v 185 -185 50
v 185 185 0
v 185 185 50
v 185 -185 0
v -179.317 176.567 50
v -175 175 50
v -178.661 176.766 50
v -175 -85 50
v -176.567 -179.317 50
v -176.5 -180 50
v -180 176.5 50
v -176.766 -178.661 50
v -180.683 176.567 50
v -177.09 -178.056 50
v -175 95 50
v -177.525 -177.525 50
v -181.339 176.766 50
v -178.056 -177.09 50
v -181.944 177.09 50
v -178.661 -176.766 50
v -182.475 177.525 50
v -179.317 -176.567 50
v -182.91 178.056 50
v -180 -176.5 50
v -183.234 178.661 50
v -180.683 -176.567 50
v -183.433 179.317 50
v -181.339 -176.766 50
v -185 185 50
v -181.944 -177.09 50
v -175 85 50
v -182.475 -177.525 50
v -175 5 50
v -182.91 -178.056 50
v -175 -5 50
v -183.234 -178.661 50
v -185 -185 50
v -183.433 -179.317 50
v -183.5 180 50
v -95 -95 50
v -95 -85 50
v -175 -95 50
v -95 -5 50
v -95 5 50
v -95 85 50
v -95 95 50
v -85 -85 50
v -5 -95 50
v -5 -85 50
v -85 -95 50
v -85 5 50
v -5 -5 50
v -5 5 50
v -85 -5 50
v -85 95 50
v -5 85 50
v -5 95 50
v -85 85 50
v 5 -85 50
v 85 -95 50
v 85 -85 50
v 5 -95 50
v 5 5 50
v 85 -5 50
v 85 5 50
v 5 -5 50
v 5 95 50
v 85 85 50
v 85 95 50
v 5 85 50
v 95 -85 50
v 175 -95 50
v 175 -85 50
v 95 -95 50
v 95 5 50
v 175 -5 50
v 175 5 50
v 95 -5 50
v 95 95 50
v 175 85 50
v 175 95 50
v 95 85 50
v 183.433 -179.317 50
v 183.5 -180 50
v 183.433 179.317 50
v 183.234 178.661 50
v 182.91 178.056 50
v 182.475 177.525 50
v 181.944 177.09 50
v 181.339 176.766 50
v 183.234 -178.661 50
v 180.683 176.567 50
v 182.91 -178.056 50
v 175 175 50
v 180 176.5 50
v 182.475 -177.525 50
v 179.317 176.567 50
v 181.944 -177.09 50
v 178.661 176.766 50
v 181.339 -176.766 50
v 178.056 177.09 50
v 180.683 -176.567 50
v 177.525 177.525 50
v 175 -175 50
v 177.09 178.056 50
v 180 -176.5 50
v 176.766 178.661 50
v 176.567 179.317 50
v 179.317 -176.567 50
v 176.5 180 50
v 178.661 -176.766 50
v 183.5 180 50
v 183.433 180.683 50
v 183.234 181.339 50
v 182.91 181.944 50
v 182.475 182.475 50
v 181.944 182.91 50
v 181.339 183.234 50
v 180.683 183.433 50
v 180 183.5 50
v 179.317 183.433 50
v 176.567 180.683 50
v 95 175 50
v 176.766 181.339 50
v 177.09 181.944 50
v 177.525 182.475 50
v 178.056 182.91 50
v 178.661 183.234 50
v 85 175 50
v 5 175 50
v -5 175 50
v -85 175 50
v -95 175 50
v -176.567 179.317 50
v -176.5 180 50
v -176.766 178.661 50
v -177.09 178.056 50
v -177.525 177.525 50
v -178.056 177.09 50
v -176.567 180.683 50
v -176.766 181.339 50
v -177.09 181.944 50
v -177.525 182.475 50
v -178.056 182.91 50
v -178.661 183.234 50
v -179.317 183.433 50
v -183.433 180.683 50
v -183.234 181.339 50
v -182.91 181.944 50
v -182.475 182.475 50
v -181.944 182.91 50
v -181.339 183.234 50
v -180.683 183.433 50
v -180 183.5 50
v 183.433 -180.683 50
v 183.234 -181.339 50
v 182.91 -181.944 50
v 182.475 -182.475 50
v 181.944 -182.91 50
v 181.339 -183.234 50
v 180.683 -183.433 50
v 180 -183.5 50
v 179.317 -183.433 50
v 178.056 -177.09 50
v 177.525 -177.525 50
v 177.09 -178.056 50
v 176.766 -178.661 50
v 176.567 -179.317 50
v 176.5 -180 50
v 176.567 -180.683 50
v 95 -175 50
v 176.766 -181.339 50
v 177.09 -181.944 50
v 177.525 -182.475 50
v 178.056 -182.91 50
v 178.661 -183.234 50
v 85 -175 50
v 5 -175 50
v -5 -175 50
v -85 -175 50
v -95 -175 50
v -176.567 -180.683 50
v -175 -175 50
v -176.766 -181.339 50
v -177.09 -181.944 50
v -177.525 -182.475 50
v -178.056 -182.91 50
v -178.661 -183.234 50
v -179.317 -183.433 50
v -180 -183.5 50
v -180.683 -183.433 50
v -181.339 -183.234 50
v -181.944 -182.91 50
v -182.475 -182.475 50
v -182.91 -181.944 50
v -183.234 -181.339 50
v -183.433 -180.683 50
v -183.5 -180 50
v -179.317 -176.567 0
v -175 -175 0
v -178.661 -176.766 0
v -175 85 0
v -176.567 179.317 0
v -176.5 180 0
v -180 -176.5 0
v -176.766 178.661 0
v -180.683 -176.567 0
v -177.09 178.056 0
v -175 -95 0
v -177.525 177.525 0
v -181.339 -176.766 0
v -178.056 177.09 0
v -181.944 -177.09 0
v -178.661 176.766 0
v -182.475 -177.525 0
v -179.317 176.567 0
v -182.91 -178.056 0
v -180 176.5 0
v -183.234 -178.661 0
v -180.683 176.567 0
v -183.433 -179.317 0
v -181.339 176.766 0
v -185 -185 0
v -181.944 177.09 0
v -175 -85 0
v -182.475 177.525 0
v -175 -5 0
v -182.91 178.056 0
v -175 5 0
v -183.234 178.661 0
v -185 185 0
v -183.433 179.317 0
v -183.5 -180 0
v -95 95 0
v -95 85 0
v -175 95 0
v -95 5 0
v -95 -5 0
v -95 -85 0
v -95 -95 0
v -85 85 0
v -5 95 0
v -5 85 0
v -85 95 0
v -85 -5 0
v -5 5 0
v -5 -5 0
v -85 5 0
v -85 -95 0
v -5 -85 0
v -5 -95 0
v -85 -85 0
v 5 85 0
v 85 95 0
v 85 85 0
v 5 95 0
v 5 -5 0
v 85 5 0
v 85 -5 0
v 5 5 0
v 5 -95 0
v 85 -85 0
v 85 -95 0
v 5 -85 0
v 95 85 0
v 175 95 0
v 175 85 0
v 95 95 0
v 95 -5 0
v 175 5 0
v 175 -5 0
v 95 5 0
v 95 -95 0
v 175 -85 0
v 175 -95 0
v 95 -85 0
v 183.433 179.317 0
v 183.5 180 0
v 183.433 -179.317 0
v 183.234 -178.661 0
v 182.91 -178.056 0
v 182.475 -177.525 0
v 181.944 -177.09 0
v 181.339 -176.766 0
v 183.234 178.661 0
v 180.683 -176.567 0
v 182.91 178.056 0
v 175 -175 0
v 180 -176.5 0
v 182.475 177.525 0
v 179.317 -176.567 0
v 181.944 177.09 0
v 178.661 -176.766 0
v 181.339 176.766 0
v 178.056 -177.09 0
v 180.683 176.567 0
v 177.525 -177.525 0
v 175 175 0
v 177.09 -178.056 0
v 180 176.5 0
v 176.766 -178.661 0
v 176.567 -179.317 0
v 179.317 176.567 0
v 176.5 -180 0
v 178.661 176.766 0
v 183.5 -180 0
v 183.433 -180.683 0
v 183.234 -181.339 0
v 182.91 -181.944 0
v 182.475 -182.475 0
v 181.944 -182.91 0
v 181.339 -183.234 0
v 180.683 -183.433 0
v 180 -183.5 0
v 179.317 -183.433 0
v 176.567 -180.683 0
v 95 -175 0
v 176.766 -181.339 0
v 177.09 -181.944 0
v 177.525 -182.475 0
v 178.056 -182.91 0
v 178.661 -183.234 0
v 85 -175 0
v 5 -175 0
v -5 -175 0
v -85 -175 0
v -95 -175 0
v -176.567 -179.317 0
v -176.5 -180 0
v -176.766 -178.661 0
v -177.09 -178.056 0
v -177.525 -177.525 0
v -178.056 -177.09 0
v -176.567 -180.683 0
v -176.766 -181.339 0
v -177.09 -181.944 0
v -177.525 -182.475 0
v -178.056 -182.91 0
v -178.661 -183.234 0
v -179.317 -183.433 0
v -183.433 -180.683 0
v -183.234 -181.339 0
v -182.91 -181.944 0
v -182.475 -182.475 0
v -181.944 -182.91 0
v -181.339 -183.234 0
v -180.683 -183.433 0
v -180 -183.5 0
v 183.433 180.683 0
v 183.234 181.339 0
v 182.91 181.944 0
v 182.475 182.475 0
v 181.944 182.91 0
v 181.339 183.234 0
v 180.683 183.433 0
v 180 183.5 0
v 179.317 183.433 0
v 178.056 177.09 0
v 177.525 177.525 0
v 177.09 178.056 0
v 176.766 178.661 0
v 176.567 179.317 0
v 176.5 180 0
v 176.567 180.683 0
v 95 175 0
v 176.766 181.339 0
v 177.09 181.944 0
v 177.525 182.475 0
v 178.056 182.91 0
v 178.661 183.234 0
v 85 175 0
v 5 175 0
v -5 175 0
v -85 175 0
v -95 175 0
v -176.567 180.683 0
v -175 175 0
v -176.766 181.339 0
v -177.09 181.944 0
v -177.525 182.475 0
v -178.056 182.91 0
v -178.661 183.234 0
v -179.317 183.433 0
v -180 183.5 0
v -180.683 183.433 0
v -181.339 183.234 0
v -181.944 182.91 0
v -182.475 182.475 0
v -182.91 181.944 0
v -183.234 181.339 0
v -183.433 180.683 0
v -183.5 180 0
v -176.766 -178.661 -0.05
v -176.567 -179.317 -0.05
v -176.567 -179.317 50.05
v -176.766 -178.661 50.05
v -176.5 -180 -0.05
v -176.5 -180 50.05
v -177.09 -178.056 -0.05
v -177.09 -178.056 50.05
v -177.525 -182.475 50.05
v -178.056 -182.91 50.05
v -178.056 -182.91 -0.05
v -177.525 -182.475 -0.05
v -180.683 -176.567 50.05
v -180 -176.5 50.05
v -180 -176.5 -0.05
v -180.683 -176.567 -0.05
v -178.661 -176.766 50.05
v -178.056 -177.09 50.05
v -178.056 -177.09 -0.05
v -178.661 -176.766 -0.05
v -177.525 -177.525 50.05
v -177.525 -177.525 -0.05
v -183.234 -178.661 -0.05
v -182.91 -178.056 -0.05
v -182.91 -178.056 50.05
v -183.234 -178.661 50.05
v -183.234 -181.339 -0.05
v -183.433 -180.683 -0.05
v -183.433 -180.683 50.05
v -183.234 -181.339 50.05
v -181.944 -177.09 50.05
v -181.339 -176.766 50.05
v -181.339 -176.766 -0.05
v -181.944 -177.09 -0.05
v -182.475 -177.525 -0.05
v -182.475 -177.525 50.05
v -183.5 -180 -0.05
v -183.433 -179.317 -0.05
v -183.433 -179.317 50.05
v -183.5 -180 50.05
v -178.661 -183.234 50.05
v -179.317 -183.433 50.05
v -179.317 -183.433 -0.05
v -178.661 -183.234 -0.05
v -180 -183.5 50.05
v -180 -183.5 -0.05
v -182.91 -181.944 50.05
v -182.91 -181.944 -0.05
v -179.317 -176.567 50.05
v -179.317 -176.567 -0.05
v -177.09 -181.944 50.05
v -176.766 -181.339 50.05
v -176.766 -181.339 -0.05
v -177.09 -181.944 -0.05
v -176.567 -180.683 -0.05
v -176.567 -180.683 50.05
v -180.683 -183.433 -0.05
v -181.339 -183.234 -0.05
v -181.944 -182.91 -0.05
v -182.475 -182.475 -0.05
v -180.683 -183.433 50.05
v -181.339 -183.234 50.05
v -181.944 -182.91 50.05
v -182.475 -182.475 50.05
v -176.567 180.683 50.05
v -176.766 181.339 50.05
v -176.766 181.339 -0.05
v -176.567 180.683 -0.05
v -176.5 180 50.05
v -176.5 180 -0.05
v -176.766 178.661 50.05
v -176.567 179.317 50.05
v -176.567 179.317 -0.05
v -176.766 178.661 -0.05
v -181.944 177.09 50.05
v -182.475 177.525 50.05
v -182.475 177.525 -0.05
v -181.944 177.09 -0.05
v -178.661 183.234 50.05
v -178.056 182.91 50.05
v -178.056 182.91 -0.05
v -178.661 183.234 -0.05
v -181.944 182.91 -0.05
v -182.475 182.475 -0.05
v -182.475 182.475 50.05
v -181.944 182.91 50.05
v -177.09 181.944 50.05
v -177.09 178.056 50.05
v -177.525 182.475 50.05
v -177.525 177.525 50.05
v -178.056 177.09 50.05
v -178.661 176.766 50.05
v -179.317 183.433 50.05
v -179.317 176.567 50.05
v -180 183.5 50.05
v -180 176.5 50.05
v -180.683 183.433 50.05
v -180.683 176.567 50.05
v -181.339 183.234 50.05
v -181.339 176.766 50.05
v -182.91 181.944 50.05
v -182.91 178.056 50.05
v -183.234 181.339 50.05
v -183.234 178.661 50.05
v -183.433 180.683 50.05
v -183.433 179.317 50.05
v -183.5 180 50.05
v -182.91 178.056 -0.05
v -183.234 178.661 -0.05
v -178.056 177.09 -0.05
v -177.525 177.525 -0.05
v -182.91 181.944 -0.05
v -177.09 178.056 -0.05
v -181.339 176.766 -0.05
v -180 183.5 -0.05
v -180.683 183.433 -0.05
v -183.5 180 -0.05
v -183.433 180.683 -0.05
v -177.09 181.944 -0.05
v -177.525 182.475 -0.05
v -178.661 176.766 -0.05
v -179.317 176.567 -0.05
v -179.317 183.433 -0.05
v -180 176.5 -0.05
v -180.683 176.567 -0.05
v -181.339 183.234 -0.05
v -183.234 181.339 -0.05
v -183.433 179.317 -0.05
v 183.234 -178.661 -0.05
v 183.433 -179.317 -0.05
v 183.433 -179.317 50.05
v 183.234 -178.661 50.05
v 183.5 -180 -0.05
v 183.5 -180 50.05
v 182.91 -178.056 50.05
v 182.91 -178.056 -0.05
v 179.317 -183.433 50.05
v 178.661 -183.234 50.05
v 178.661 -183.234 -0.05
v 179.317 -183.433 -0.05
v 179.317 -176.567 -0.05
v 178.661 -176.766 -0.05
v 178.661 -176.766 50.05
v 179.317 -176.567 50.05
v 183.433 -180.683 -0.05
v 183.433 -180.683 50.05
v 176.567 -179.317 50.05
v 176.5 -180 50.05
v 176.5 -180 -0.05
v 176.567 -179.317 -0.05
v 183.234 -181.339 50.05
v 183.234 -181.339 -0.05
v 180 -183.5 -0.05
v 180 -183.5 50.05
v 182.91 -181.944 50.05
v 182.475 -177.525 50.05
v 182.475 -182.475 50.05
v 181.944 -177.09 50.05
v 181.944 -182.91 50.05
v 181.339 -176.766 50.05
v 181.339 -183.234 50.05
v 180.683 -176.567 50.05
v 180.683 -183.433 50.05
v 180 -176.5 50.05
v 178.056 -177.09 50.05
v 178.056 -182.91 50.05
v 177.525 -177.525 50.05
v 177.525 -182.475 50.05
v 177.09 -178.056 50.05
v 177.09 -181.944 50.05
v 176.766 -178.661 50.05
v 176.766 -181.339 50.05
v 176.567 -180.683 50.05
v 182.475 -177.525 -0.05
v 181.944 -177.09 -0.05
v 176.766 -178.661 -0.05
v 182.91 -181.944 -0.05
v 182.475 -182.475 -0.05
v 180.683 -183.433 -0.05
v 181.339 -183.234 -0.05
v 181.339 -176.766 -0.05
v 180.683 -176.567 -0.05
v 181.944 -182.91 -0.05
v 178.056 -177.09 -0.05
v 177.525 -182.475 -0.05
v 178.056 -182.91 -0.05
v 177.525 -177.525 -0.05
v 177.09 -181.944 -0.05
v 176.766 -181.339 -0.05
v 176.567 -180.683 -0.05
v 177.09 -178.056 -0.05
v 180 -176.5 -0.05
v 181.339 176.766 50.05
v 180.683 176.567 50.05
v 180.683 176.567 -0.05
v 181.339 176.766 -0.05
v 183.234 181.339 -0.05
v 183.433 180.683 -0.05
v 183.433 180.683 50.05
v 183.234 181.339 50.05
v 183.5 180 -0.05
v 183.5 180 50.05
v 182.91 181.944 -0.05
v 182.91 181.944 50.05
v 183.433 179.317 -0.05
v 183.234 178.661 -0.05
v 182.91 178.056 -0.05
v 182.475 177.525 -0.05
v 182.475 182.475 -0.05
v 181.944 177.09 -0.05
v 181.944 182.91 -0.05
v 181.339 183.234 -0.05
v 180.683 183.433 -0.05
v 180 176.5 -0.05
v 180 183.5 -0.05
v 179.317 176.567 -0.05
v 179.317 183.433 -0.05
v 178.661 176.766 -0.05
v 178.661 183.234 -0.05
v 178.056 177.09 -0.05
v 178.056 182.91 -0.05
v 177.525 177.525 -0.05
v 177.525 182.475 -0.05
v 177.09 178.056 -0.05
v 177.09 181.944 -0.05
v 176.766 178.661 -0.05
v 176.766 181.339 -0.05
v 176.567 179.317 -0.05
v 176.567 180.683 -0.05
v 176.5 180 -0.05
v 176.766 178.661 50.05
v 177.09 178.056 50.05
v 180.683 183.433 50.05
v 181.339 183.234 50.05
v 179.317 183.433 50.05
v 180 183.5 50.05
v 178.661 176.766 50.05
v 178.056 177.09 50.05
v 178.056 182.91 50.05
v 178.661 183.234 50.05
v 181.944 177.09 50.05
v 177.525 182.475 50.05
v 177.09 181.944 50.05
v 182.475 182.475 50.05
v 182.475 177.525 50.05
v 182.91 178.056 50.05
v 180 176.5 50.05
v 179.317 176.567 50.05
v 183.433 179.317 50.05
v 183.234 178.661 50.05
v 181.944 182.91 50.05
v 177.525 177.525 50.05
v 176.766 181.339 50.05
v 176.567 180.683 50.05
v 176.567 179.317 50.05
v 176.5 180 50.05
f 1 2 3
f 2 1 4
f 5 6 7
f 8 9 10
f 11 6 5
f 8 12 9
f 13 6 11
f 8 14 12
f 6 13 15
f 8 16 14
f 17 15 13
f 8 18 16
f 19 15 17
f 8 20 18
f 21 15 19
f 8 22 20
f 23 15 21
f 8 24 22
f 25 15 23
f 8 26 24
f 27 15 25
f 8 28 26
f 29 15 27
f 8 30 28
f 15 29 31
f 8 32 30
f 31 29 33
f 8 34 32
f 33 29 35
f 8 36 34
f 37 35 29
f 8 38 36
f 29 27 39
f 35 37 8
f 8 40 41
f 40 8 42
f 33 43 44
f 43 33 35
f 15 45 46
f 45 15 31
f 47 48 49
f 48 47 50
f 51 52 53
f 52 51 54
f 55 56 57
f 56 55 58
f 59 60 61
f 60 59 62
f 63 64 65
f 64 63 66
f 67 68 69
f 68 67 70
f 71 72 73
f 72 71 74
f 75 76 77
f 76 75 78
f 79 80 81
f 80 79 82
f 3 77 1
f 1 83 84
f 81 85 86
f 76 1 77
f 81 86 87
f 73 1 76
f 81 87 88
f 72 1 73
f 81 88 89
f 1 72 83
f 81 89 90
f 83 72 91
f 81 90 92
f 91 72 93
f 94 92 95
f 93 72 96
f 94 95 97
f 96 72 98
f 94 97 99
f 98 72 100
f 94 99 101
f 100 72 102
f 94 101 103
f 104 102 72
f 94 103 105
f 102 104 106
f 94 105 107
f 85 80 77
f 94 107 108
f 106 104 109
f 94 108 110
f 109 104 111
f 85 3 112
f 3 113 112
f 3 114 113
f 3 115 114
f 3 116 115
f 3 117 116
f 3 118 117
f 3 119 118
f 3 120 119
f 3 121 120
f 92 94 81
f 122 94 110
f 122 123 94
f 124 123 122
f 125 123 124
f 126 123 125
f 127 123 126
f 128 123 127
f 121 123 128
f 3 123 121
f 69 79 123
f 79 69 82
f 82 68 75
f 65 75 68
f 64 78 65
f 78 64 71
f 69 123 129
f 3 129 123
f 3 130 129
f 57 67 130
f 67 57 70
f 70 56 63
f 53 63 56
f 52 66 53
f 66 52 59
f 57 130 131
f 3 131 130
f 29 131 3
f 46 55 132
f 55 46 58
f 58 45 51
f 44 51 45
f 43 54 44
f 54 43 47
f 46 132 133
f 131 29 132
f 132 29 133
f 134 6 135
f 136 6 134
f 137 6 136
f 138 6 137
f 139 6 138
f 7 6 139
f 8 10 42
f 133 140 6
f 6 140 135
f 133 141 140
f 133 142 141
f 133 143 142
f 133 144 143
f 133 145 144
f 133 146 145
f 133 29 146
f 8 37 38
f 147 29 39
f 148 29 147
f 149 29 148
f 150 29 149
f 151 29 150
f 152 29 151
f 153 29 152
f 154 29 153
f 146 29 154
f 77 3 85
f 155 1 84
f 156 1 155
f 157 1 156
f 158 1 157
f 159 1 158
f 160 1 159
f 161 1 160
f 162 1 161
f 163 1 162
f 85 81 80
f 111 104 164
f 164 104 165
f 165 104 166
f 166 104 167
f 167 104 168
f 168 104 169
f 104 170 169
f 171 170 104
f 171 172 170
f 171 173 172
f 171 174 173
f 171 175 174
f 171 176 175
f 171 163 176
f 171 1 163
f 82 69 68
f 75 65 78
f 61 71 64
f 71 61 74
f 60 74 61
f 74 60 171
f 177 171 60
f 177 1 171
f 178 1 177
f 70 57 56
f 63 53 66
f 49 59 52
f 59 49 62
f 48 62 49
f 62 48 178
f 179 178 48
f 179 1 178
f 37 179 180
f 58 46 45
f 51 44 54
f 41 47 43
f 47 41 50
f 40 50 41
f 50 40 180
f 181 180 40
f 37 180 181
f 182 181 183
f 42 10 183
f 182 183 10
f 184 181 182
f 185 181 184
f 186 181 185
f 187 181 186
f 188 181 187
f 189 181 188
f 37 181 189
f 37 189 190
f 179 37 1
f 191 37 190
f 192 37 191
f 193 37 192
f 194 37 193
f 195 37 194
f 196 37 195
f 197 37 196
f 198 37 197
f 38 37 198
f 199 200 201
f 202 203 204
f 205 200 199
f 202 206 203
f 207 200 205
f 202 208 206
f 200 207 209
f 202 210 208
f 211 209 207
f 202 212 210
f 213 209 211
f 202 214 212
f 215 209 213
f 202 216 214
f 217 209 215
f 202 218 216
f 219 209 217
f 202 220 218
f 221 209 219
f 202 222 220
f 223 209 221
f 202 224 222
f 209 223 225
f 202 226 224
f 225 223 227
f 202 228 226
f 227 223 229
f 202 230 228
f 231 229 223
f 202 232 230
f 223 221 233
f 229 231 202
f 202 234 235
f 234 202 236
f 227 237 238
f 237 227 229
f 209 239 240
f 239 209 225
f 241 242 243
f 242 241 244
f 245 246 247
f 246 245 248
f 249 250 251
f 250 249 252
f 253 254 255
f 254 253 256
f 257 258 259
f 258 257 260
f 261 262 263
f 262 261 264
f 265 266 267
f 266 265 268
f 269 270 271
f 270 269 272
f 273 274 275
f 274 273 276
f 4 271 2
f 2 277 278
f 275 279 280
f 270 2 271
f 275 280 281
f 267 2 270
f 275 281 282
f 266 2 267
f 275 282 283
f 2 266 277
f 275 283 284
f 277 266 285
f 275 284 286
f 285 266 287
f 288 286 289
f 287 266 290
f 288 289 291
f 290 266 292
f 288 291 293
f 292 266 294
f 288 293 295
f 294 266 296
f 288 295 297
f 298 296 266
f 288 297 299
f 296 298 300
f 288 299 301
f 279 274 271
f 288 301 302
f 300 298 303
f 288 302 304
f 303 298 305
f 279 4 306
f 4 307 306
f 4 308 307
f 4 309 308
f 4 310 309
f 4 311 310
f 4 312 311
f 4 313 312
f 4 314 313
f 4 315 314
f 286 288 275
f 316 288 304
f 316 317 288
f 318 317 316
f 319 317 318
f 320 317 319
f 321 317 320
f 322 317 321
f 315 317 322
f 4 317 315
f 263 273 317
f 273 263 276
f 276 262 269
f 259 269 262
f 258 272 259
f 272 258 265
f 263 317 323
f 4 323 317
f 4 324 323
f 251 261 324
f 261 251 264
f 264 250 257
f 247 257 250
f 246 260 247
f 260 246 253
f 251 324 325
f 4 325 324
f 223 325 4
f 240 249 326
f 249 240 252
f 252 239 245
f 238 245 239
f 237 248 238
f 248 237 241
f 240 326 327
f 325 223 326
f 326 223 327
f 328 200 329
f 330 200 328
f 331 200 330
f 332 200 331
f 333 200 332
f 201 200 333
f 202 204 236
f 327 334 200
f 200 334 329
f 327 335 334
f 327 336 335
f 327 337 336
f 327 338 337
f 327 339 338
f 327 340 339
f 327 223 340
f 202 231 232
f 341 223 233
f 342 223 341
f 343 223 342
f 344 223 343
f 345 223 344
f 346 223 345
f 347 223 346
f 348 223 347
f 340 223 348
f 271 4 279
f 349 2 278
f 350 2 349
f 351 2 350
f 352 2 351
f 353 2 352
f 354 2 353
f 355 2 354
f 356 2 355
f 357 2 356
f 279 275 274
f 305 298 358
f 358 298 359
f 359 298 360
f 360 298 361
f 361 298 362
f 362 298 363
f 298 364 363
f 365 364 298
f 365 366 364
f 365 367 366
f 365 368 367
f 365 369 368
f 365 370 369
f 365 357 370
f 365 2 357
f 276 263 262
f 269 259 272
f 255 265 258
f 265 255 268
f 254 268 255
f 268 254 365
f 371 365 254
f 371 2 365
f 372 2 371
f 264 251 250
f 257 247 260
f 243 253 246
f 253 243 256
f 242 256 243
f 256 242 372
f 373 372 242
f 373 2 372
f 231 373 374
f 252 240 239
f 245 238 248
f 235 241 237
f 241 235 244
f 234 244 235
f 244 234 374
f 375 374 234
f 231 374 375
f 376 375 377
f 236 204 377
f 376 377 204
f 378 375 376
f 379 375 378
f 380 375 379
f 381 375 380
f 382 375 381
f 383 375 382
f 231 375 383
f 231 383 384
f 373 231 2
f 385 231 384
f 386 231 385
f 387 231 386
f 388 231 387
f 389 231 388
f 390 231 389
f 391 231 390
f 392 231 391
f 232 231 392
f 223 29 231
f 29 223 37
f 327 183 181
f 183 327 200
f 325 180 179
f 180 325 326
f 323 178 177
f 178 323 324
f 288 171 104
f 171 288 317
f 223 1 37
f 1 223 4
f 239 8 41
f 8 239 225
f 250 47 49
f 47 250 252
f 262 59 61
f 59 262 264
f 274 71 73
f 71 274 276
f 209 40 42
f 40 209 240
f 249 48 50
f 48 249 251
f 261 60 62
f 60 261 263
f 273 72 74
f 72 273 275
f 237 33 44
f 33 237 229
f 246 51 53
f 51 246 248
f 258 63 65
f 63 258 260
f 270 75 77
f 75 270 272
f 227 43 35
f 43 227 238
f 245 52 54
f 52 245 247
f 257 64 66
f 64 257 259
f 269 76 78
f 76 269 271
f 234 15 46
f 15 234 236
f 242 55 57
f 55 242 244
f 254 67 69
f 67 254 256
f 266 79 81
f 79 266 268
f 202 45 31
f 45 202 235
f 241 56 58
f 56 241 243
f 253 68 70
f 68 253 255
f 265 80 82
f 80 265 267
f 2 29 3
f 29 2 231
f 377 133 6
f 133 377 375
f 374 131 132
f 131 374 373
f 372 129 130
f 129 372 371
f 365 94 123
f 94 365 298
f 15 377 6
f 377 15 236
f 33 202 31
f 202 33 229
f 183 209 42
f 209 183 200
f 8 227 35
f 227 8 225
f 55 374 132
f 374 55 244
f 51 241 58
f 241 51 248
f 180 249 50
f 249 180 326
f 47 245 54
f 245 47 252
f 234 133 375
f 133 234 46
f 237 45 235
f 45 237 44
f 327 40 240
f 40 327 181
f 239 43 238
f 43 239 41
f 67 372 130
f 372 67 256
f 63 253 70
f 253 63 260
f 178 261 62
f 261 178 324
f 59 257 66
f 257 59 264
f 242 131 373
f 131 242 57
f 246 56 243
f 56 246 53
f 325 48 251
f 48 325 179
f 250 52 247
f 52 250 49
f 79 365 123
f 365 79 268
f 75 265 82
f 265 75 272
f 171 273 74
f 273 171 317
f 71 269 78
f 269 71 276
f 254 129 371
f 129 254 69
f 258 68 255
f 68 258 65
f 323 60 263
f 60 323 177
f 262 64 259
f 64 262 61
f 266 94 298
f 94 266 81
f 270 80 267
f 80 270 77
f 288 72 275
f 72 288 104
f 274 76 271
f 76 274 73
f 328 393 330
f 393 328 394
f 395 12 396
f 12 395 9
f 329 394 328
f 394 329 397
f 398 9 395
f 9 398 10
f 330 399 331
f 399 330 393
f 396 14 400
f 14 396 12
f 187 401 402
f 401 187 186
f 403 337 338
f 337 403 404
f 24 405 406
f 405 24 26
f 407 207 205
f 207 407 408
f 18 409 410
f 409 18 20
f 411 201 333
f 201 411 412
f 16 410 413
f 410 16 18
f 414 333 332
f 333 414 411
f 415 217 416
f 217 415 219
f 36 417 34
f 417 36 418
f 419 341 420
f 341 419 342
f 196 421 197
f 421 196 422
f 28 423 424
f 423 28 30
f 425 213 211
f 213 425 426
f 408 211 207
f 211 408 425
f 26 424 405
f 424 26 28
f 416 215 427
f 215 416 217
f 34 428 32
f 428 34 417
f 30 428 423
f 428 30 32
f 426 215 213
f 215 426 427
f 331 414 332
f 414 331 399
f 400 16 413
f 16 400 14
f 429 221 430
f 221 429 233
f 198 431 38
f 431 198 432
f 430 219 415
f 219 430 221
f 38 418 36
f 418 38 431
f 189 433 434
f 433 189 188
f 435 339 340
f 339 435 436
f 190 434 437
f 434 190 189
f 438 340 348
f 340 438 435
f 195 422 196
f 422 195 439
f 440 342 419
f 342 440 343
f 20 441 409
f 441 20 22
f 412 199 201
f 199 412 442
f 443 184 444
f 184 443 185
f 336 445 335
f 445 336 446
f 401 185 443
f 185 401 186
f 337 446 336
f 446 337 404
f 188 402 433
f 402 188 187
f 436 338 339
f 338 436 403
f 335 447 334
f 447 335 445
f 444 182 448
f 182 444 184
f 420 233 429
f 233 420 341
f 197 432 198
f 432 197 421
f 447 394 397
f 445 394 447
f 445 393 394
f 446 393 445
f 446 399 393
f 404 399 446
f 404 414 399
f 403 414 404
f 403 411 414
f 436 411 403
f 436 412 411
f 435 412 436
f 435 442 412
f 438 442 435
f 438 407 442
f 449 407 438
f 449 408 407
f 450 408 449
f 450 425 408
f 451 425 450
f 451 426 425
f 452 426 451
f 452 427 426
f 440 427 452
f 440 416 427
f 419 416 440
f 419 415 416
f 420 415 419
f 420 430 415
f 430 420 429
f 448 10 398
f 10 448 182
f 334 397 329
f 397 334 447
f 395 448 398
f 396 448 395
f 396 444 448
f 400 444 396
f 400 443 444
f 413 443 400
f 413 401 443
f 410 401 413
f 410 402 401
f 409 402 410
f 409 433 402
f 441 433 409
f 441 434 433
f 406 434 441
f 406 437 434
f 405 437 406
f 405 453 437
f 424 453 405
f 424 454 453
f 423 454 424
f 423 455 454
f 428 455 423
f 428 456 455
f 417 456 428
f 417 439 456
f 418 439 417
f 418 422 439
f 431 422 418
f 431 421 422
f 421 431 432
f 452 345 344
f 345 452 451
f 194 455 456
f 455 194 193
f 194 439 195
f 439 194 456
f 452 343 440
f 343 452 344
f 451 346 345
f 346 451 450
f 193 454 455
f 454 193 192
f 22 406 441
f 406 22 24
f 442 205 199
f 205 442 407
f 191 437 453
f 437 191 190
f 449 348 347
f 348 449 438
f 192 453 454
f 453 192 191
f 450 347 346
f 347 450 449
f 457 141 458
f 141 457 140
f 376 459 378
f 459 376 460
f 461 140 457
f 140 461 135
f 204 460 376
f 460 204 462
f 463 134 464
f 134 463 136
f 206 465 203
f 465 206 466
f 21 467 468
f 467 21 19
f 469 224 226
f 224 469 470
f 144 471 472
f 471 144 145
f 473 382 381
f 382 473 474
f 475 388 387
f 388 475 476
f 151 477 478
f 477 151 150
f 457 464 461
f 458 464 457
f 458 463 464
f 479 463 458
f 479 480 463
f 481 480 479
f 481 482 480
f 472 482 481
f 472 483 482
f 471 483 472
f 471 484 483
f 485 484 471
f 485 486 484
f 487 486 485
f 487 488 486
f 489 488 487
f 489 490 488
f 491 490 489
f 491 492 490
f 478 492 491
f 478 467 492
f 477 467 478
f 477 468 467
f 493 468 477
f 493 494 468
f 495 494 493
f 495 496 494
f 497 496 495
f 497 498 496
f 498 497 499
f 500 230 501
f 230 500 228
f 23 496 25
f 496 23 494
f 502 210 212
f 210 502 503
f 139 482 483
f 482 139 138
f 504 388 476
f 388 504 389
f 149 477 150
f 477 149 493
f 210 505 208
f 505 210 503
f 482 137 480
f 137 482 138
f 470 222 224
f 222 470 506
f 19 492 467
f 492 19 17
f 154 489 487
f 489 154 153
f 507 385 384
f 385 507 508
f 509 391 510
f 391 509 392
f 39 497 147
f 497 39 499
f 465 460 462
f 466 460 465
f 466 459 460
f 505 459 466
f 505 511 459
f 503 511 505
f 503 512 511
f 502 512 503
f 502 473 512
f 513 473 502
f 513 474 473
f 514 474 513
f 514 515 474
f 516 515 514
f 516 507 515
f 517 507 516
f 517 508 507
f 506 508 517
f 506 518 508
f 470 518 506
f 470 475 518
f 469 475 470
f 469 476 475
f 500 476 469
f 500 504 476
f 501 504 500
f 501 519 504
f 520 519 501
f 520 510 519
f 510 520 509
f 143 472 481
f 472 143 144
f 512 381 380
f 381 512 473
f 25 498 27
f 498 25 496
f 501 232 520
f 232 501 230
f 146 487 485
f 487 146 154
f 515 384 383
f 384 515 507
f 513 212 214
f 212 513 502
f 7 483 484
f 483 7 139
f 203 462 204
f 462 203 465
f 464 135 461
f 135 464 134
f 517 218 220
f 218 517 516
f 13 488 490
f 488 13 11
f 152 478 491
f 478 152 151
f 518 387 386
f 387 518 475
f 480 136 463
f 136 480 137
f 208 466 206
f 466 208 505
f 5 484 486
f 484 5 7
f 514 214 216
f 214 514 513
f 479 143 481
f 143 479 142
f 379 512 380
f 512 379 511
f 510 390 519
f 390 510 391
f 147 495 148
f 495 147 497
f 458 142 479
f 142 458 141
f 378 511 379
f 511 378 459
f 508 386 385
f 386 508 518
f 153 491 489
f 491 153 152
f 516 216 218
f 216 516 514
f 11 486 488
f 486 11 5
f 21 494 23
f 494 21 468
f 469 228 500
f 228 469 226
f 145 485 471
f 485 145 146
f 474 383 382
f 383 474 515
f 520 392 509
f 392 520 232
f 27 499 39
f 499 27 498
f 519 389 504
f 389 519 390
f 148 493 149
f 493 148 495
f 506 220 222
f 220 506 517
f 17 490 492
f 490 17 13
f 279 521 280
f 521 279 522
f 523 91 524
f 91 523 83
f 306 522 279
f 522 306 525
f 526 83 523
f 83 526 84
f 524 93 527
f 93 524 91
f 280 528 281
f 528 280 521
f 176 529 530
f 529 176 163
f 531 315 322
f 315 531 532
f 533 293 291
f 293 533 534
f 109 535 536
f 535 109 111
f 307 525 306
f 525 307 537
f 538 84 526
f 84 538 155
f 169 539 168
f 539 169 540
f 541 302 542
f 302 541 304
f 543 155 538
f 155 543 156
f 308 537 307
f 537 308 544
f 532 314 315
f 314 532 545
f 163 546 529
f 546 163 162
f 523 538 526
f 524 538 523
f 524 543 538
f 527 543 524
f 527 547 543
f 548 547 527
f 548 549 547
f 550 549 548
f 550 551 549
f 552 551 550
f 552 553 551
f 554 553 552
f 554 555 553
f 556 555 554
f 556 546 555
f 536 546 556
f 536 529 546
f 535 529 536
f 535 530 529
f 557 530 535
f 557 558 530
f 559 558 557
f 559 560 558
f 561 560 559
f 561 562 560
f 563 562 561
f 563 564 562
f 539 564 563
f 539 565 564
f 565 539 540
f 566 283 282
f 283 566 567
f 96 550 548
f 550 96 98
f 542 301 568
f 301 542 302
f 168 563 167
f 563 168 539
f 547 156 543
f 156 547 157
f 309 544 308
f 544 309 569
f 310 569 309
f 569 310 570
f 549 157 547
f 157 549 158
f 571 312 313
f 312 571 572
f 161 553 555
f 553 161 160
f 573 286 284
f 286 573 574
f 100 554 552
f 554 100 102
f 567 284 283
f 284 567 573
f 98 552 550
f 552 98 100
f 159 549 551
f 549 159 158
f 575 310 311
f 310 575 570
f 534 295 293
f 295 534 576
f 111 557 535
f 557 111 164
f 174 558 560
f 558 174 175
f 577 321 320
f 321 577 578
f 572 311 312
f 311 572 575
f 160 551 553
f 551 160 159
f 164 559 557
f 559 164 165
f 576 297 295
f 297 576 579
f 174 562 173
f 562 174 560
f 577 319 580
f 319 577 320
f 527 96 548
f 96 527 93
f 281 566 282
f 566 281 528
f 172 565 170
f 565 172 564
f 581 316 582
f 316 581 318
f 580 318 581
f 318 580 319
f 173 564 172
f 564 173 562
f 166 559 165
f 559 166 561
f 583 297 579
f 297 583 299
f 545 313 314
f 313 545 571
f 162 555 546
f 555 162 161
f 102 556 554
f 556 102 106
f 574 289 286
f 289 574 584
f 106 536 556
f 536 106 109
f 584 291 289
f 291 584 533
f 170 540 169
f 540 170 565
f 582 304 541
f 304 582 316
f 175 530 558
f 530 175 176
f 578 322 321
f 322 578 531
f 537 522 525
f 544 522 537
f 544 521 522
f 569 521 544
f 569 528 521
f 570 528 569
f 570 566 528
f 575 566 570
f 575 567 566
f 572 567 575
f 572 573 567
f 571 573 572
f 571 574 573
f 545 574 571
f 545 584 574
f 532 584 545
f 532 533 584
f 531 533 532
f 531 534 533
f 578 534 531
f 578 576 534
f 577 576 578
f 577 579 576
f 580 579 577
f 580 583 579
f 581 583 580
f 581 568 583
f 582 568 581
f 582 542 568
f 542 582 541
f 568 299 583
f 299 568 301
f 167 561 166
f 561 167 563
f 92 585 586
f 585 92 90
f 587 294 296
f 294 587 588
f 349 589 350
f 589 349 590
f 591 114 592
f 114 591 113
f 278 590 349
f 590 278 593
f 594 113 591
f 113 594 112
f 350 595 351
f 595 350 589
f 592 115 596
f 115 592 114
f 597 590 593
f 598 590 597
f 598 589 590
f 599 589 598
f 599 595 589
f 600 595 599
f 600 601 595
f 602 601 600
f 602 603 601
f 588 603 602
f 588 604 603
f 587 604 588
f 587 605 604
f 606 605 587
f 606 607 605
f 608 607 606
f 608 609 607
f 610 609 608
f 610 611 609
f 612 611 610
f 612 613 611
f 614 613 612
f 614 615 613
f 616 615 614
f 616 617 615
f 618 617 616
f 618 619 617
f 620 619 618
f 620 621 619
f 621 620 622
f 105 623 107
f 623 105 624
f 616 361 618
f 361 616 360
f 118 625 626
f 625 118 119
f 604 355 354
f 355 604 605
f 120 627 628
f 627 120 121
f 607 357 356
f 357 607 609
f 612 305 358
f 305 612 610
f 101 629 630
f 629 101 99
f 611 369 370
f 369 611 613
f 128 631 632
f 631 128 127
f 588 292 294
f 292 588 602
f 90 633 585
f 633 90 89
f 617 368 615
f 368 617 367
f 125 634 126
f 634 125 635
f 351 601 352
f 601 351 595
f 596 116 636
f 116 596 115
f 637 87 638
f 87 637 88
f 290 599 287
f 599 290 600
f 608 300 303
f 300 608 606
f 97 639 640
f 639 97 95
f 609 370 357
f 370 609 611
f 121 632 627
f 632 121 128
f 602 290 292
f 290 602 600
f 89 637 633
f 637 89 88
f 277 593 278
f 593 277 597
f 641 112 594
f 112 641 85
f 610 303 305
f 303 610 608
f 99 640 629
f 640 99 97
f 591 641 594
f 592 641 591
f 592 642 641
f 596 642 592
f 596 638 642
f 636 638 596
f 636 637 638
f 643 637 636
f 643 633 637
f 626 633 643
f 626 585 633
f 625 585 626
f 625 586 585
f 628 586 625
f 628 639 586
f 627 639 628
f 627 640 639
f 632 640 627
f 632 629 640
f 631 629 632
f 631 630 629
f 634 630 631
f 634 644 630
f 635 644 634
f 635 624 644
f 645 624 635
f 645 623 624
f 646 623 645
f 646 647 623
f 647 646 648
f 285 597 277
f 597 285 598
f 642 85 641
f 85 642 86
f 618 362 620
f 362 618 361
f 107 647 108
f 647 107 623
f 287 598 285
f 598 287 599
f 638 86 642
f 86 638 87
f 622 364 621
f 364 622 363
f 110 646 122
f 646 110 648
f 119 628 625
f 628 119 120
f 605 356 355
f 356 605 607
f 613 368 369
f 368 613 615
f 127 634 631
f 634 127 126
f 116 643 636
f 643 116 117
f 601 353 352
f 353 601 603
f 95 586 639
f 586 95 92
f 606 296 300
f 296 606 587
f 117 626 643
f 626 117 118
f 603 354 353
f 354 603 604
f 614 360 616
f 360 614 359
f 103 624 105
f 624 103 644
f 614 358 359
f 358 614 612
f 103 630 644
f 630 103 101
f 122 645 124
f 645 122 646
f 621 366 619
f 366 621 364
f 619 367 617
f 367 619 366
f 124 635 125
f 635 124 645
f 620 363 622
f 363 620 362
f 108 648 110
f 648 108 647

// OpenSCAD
// Part Name: Cage_Layer_4_H50mm
// This part represents a horizontal slice of the cage.
// It is designed to be 3D printed on its base.

// Parameters for the cage
bar_t = 10;
gap_xy = 80;
hole_d = 7;
cage_ext_xy = 370;

// Calculate bar center positions relative to the overall cage center
bar_centers_xy = [for (j = [0:4]) (-cage_ext_xy/2 + bar_t/2 + j * (bar_t + gap_xy))];

// Module to generate a single layer segment
module cage_layer_segment(height) {
    // Offset for printing on z=0 plane. The module itself is centered on XY=0, so this Z offset moves its base to Z=0.
    translate([0, 0, height/2]) {
        union() {
            // Horizontal bars (along X)
            for (y_center = bar_centers_xy) {
                translate([0, y_center, 0])
                cube([cage_ext_xy, bar_t, height], center = true);
            }

            // Vertical bars (along Y)
            for (x_center = bar_centers_xy) {
                translate([x_center, 0, 0])
                cube([bar_t, cage_ext_xy, height], center = true);
            }

            // Subtract holes for M6 rods at the 4 corners
            corner_offsets_xy = [bar_centers_xy[0], bar_centers_xy[4]];

            for (x_offset = corner_offsets_xy) {
                for (y_offset = corner_offsets_xy) {
                    // Hole through the center of the corner bar
                    translate([x_offset, y_offset, 0])
                    cylinder(h = height + 0.1, d = hole_d, center = true, $fn=32); // +0.1 for clean cut
                }
            }
        }
    }
}

// Render the segment
cage_layer_segment(50);
